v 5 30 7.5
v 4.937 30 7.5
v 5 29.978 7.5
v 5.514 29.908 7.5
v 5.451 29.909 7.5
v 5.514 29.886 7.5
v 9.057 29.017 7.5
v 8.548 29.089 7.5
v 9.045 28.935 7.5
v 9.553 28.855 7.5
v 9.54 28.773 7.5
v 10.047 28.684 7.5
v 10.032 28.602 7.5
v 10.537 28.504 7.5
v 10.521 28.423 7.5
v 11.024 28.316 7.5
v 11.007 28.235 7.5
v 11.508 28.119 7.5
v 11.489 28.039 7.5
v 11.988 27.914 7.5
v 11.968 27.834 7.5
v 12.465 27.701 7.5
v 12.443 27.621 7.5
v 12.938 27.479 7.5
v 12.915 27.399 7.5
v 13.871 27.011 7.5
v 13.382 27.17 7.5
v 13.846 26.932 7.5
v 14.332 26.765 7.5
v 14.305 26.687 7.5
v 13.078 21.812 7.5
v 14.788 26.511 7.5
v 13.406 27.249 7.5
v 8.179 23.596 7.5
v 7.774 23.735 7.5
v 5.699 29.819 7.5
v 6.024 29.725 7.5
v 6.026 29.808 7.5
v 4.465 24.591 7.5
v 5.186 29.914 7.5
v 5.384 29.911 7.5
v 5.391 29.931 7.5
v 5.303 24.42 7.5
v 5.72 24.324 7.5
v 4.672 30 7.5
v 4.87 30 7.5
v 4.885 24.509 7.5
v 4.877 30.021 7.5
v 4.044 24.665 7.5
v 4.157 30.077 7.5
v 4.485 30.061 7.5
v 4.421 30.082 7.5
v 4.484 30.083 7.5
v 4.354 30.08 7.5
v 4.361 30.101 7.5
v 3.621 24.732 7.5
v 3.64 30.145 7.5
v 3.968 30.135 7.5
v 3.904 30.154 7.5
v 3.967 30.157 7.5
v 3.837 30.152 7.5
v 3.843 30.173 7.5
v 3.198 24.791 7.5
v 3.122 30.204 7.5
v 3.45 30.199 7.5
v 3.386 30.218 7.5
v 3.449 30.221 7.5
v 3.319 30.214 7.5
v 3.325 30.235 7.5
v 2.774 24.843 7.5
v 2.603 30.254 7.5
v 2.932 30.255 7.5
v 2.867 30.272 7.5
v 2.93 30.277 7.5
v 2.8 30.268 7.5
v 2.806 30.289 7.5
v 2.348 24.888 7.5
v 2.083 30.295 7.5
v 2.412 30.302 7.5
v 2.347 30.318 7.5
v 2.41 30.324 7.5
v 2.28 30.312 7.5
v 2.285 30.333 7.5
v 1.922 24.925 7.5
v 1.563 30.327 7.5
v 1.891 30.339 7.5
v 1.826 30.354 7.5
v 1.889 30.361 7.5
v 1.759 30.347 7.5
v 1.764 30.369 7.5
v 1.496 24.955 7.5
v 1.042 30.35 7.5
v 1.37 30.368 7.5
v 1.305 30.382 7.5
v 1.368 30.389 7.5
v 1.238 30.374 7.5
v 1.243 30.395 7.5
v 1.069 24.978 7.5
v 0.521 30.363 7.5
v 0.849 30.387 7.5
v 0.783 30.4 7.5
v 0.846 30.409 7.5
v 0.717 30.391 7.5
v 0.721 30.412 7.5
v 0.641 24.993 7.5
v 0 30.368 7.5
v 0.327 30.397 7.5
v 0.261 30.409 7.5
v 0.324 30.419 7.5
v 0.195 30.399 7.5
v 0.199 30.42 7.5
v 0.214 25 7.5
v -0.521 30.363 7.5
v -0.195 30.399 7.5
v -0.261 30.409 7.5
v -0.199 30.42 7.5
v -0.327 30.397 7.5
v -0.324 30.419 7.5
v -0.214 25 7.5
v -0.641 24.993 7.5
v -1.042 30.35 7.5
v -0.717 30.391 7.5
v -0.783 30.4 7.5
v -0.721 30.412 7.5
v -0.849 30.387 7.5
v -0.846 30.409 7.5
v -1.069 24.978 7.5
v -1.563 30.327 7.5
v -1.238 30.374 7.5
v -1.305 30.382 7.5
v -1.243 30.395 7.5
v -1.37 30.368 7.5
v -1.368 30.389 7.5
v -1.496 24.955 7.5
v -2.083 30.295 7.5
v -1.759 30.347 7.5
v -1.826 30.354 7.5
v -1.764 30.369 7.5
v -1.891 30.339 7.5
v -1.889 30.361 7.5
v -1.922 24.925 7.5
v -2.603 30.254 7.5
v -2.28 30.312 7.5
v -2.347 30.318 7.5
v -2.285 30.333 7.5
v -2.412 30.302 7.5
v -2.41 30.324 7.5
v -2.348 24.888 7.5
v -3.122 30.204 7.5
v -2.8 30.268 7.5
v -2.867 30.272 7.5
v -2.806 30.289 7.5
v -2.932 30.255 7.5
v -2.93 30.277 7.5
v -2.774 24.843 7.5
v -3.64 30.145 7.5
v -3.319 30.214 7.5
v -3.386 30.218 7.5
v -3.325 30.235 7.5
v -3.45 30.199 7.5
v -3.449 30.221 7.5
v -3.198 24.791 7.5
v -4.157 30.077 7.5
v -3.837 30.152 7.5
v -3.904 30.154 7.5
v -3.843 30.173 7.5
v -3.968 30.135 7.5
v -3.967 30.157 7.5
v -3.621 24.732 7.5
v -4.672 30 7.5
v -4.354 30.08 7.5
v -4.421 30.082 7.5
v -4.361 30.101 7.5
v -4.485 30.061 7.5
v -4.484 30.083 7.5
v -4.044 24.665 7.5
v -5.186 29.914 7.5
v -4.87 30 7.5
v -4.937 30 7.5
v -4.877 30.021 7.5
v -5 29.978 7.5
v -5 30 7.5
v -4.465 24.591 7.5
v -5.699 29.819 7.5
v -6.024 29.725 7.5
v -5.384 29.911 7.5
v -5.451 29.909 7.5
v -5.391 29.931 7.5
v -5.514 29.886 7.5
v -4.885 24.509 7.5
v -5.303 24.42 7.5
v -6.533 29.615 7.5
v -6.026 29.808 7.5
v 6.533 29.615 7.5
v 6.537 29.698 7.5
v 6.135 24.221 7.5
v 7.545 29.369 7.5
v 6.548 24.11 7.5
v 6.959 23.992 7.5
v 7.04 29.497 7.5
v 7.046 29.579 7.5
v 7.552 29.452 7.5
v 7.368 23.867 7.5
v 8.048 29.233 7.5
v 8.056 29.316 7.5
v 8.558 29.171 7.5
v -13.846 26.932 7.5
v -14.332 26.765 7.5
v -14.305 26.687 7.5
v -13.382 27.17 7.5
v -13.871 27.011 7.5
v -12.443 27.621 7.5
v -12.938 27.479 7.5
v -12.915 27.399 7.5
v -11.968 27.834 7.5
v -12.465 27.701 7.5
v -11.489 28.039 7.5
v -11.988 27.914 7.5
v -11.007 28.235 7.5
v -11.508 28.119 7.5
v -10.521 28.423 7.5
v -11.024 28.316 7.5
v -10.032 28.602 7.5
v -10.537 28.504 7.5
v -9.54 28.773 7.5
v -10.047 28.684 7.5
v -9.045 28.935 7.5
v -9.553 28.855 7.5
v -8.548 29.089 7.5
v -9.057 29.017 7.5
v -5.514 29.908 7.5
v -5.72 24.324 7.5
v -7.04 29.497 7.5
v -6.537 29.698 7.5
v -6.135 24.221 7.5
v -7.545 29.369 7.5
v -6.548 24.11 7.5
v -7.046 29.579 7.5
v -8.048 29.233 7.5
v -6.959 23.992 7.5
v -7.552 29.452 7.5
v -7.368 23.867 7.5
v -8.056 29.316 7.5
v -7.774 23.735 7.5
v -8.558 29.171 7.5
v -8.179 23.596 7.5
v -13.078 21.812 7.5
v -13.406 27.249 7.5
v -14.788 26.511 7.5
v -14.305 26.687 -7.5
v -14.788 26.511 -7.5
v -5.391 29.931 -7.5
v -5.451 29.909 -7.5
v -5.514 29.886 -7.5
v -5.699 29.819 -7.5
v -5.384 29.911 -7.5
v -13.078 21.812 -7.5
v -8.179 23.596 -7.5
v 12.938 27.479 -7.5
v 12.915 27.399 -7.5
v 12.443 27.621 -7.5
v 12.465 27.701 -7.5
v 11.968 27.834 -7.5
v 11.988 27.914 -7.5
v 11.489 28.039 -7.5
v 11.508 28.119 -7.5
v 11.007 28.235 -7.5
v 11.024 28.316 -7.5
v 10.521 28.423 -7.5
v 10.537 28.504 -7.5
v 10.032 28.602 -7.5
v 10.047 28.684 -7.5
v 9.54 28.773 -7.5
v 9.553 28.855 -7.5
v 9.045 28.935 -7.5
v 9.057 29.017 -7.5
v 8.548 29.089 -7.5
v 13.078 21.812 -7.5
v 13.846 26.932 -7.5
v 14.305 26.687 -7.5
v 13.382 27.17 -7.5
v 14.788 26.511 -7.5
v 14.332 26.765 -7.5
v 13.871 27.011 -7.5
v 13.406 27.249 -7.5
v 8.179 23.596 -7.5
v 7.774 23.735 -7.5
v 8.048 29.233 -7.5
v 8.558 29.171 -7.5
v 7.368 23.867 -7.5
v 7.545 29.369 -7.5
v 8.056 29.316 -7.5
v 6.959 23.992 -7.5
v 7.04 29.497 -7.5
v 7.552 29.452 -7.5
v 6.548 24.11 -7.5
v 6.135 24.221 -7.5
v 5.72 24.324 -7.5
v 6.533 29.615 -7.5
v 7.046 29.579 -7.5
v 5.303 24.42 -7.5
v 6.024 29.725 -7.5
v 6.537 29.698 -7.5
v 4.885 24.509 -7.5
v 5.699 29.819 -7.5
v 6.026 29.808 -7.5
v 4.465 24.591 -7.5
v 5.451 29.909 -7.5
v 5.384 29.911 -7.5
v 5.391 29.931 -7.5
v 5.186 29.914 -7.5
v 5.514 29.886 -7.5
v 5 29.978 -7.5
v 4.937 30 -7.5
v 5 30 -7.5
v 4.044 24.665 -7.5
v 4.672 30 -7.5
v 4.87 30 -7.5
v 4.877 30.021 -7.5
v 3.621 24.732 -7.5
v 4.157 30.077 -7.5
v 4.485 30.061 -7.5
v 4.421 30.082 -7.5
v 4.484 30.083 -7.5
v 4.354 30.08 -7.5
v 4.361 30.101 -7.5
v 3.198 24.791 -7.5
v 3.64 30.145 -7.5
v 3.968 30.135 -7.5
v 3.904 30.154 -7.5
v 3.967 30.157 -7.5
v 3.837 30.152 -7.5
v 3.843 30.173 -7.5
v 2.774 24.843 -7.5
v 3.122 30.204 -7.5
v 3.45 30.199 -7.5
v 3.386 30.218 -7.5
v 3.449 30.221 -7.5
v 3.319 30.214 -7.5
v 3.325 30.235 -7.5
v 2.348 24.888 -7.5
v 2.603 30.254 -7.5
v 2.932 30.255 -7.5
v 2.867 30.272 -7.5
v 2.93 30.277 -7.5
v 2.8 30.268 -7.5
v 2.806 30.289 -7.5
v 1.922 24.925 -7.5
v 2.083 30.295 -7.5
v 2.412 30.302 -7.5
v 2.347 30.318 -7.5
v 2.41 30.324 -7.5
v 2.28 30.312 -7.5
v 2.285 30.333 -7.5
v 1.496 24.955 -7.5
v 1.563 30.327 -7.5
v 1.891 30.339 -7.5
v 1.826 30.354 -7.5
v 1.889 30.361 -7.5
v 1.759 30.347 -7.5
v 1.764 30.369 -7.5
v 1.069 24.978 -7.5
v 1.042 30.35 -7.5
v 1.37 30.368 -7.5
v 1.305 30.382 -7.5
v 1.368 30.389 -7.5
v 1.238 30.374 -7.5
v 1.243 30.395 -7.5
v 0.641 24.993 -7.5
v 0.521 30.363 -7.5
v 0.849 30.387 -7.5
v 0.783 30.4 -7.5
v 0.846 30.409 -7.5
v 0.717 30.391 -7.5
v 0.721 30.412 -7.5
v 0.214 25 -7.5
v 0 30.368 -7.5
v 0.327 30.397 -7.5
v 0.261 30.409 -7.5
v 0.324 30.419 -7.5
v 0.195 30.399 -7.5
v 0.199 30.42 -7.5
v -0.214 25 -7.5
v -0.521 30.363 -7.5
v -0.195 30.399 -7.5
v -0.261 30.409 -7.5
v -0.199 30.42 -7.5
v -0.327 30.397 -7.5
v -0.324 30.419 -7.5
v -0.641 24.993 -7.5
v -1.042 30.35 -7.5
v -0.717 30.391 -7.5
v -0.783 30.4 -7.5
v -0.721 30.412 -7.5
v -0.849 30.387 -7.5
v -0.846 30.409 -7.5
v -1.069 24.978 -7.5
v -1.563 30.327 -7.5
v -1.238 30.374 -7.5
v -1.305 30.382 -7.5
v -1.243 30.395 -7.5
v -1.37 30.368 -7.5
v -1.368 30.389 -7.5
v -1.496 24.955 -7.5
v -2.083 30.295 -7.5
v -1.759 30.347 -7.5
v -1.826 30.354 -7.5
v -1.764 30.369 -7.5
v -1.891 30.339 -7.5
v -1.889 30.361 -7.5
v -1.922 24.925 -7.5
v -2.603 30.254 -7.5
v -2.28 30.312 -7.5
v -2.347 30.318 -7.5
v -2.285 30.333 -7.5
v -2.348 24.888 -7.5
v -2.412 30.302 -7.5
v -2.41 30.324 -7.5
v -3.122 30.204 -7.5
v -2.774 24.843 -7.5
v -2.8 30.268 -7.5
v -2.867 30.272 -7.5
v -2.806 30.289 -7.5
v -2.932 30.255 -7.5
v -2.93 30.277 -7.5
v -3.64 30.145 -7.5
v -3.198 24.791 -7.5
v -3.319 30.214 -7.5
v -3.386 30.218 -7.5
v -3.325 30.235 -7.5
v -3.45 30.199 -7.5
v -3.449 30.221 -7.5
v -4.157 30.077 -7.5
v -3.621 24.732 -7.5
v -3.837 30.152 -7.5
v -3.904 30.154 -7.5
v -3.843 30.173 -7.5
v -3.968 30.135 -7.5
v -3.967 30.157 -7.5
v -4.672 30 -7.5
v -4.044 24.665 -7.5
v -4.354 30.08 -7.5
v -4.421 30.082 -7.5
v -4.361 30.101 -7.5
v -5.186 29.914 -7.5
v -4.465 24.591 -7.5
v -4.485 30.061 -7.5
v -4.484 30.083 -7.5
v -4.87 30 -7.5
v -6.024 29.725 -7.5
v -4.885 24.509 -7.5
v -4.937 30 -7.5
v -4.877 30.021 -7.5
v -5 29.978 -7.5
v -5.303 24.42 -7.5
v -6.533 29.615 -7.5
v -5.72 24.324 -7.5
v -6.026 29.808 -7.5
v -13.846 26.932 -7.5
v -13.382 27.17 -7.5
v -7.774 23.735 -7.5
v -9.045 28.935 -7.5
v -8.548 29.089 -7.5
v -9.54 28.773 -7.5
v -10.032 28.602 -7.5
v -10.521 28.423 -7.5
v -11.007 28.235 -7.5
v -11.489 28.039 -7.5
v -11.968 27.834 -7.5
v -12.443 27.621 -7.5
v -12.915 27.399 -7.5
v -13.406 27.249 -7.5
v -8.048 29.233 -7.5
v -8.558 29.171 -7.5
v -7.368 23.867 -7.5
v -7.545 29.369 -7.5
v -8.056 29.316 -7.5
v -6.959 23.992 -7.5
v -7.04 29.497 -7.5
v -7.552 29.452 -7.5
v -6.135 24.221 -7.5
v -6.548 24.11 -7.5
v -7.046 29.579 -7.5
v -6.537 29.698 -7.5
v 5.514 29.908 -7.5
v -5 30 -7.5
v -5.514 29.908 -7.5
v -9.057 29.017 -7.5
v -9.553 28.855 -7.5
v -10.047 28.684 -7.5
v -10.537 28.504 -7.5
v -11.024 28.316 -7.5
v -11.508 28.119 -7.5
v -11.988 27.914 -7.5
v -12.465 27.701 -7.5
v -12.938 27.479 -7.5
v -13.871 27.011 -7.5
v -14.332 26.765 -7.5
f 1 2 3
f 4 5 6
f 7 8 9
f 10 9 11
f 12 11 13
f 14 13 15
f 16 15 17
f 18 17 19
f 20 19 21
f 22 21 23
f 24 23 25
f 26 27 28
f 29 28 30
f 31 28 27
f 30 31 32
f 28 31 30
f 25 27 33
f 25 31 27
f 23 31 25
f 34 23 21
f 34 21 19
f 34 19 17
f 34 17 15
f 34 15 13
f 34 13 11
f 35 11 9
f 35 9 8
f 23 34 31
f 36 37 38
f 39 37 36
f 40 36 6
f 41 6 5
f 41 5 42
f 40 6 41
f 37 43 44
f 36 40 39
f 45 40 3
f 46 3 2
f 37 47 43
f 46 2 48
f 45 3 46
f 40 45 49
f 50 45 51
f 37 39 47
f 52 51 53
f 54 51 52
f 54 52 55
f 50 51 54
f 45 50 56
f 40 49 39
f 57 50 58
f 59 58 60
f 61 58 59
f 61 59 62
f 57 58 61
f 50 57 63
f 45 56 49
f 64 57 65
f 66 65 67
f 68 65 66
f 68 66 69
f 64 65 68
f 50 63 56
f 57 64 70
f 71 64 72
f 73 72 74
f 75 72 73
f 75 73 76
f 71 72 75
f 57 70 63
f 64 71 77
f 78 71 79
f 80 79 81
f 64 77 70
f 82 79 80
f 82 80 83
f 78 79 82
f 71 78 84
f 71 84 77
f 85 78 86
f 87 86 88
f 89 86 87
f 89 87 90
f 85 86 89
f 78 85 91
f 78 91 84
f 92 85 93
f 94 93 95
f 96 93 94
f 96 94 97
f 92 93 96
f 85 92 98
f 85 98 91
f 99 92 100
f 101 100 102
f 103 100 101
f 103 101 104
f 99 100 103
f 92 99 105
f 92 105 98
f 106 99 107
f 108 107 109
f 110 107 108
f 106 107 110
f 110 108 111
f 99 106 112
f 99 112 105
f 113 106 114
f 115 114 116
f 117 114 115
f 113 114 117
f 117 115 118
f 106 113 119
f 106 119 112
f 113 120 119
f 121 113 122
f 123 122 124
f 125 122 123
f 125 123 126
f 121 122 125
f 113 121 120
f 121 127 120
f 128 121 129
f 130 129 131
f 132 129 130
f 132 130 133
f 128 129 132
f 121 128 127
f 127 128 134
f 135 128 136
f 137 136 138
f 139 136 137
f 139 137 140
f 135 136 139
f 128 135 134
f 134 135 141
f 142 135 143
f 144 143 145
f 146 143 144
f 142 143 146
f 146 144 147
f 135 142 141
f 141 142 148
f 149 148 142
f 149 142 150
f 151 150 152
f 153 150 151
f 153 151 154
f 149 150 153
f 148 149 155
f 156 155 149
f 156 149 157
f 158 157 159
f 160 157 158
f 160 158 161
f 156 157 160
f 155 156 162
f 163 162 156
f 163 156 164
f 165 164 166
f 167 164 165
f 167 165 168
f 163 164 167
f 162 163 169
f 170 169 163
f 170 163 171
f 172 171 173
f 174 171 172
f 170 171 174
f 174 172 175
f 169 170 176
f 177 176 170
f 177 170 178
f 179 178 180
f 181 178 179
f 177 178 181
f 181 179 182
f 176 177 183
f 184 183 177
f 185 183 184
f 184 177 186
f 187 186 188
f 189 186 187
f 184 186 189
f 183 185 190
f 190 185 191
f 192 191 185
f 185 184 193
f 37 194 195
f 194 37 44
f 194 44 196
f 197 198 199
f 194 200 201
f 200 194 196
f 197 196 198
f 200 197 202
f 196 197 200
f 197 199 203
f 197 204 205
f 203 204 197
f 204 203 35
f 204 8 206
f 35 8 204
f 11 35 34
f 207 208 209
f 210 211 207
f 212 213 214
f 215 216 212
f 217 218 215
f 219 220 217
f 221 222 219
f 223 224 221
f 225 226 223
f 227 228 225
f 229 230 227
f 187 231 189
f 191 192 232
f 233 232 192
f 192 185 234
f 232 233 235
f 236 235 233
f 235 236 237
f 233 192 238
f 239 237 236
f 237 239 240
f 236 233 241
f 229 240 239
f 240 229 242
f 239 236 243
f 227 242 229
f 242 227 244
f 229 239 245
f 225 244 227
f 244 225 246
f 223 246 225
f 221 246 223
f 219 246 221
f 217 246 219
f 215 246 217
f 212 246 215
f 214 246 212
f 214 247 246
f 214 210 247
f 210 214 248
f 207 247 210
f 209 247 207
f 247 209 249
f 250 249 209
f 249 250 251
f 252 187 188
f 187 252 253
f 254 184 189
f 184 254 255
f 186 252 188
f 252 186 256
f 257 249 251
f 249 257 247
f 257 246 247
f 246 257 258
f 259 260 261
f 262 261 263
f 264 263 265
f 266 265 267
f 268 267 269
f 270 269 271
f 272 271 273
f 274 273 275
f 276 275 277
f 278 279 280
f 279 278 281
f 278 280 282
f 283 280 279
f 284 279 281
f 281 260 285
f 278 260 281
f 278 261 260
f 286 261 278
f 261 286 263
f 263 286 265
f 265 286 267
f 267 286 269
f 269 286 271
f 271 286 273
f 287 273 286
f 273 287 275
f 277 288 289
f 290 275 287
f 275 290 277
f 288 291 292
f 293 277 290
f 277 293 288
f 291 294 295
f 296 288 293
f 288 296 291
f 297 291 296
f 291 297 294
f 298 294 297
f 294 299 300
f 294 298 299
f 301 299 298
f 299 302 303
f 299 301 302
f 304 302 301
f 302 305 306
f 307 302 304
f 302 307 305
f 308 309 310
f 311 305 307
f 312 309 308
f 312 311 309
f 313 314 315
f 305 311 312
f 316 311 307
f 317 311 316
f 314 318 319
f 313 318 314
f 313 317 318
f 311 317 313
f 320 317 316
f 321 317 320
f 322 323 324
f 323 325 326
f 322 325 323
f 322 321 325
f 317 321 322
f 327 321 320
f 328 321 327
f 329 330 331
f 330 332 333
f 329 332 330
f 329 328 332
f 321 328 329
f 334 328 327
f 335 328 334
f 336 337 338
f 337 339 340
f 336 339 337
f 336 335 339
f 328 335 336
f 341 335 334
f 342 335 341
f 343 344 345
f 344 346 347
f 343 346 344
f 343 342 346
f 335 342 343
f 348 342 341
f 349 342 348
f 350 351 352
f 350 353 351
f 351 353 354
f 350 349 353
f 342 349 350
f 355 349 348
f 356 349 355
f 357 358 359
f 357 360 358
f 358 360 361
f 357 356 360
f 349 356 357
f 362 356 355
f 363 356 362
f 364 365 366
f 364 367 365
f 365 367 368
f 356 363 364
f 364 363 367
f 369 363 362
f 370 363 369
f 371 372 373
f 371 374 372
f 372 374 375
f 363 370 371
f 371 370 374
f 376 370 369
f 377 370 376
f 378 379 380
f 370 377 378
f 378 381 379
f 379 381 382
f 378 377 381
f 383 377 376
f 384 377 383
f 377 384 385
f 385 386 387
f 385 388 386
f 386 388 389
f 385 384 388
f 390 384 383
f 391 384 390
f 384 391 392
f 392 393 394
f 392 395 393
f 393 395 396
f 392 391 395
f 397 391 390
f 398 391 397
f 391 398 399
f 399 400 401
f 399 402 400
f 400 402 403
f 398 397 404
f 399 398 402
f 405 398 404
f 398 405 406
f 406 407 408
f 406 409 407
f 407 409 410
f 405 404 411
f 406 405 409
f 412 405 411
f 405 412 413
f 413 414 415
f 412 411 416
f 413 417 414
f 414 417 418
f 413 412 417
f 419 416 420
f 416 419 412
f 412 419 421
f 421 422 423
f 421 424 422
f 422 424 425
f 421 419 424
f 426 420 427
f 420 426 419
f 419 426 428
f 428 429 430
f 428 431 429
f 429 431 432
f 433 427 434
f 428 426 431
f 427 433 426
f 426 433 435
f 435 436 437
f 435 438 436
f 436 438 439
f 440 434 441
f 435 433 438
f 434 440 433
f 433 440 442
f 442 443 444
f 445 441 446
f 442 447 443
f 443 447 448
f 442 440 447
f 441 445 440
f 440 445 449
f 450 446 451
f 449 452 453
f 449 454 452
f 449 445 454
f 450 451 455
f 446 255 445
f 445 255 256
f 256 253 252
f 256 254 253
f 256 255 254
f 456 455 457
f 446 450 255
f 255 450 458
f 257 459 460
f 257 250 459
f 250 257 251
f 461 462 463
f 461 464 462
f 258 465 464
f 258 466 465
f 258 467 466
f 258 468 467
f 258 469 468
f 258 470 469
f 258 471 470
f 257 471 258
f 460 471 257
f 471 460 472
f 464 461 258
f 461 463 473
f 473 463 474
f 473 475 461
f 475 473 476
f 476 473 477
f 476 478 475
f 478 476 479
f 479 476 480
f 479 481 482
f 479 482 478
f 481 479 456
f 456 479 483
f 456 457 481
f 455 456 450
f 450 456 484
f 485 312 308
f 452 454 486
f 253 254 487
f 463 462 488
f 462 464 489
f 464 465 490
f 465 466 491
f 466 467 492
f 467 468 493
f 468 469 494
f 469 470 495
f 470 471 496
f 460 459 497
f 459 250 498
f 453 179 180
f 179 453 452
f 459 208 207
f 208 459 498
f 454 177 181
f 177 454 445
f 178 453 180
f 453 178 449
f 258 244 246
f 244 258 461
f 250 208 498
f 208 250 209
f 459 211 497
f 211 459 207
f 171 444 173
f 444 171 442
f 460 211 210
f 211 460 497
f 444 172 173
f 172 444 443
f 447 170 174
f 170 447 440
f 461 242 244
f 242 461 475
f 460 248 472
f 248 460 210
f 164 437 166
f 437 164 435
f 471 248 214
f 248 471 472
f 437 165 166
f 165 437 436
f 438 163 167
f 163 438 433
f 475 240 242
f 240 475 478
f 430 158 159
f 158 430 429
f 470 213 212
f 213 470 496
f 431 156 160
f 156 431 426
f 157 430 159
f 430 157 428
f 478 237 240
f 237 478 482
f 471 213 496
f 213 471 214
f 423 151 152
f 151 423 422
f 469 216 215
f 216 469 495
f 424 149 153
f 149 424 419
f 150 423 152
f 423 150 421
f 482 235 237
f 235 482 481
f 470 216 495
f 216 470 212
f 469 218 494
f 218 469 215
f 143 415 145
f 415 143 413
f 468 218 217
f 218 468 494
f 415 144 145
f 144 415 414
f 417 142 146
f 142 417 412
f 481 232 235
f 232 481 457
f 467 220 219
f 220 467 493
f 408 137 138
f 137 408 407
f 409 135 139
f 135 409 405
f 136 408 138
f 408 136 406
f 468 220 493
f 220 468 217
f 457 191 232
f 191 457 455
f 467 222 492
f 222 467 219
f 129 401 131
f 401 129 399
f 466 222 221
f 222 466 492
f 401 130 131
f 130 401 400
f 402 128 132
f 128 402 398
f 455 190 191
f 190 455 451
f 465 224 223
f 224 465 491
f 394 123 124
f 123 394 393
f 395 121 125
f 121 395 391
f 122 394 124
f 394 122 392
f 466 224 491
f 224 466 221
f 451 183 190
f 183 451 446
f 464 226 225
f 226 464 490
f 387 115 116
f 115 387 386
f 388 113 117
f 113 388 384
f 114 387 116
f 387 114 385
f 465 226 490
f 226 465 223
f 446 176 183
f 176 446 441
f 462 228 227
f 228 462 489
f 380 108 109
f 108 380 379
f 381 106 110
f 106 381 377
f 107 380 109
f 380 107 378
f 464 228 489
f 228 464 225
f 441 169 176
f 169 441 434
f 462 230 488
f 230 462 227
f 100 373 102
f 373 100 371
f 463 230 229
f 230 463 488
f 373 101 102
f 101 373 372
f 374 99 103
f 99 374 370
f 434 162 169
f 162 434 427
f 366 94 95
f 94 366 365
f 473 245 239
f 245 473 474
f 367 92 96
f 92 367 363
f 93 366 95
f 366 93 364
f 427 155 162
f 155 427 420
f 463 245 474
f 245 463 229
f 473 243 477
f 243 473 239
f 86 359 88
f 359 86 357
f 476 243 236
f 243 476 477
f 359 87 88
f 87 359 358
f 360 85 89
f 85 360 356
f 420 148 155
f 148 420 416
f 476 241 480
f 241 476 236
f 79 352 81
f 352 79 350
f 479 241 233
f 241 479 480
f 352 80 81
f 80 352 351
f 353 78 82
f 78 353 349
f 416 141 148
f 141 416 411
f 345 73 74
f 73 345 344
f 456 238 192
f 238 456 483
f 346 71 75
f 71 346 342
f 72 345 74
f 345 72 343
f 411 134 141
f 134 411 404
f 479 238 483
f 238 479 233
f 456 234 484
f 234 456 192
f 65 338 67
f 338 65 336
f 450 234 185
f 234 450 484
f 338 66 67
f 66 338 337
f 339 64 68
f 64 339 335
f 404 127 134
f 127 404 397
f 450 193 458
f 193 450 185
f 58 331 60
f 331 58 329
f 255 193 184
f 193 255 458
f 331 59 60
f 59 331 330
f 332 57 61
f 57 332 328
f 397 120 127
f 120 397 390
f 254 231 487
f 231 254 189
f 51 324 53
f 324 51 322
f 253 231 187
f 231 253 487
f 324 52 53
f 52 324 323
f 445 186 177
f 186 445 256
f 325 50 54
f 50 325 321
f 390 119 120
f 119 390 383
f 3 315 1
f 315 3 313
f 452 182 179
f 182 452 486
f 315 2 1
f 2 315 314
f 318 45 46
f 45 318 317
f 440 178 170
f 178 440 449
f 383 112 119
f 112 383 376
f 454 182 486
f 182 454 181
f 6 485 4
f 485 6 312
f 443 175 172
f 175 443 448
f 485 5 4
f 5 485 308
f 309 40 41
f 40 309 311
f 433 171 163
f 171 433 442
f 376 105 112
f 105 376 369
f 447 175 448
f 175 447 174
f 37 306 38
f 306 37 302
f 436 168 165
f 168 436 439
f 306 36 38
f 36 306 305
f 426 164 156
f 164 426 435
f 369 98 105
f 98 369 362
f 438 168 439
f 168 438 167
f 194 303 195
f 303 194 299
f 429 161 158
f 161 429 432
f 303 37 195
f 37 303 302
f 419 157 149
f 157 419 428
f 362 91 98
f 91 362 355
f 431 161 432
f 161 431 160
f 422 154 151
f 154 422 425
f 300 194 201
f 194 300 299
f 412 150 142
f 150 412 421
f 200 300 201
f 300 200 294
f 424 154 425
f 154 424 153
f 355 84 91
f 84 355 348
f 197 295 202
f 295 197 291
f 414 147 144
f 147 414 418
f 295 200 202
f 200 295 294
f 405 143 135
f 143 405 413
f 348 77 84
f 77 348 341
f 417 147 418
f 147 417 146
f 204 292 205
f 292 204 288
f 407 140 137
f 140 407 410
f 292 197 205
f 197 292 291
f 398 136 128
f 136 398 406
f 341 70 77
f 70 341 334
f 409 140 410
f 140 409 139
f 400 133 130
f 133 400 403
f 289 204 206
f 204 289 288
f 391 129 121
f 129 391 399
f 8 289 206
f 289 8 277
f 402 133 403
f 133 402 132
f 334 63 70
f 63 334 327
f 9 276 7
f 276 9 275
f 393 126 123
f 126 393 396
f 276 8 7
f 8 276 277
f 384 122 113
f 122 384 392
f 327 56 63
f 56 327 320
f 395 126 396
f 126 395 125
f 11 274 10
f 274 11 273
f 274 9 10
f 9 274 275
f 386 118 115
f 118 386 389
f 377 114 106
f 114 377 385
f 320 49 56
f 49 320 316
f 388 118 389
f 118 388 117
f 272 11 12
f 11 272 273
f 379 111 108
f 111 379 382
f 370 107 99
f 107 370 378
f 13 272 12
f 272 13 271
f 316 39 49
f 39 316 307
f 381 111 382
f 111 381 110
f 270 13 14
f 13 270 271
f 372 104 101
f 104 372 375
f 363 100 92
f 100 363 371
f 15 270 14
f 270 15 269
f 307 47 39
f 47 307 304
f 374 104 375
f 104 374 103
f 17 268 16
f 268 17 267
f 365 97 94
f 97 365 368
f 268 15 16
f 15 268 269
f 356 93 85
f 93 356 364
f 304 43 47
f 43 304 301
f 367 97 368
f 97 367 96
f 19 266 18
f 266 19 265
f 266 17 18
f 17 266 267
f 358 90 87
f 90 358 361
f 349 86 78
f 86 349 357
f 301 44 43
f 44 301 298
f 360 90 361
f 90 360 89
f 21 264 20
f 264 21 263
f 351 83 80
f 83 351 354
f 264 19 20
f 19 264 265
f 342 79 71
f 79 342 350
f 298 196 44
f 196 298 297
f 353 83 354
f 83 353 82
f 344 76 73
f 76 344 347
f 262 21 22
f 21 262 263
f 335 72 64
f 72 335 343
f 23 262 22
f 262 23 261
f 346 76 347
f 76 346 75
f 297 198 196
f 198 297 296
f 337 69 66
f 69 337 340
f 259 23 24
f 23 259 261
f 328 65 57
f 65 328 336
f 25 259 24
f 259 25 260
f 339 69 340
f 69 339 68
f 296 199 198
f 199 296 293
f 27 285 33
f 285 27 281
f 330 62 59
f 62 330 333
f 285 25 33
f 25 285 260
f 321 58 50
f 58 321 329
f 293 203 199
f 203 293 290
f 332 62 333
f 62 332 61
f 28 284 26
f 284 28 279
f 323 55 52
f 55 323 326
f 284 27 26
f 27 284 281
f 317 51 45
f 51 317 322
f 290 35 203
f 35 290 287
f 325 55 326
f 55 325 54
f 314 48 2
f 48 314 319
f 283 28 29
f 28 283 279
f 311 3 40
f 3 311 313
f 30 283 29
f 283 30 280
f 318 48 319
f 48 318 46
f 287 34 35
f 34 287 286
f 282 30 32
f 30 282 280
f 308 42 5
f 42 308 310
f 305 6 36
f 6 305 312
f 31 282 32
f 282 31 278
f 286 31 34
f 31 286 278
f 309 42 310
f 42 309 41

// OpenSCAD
//$fn=40;
//range=40;
smile(_range=40,_size=5);

module smile(_range=40,_size=5) {
rotate([-90,0,0])
color("green")
for (i = [-_range/2:1:_range/2])
  translate([0,0,1/2])  
    rotate([0,i,0])
        translate([0,0,27])
            cube([_size+5,_size+10,_size], center=true);}
